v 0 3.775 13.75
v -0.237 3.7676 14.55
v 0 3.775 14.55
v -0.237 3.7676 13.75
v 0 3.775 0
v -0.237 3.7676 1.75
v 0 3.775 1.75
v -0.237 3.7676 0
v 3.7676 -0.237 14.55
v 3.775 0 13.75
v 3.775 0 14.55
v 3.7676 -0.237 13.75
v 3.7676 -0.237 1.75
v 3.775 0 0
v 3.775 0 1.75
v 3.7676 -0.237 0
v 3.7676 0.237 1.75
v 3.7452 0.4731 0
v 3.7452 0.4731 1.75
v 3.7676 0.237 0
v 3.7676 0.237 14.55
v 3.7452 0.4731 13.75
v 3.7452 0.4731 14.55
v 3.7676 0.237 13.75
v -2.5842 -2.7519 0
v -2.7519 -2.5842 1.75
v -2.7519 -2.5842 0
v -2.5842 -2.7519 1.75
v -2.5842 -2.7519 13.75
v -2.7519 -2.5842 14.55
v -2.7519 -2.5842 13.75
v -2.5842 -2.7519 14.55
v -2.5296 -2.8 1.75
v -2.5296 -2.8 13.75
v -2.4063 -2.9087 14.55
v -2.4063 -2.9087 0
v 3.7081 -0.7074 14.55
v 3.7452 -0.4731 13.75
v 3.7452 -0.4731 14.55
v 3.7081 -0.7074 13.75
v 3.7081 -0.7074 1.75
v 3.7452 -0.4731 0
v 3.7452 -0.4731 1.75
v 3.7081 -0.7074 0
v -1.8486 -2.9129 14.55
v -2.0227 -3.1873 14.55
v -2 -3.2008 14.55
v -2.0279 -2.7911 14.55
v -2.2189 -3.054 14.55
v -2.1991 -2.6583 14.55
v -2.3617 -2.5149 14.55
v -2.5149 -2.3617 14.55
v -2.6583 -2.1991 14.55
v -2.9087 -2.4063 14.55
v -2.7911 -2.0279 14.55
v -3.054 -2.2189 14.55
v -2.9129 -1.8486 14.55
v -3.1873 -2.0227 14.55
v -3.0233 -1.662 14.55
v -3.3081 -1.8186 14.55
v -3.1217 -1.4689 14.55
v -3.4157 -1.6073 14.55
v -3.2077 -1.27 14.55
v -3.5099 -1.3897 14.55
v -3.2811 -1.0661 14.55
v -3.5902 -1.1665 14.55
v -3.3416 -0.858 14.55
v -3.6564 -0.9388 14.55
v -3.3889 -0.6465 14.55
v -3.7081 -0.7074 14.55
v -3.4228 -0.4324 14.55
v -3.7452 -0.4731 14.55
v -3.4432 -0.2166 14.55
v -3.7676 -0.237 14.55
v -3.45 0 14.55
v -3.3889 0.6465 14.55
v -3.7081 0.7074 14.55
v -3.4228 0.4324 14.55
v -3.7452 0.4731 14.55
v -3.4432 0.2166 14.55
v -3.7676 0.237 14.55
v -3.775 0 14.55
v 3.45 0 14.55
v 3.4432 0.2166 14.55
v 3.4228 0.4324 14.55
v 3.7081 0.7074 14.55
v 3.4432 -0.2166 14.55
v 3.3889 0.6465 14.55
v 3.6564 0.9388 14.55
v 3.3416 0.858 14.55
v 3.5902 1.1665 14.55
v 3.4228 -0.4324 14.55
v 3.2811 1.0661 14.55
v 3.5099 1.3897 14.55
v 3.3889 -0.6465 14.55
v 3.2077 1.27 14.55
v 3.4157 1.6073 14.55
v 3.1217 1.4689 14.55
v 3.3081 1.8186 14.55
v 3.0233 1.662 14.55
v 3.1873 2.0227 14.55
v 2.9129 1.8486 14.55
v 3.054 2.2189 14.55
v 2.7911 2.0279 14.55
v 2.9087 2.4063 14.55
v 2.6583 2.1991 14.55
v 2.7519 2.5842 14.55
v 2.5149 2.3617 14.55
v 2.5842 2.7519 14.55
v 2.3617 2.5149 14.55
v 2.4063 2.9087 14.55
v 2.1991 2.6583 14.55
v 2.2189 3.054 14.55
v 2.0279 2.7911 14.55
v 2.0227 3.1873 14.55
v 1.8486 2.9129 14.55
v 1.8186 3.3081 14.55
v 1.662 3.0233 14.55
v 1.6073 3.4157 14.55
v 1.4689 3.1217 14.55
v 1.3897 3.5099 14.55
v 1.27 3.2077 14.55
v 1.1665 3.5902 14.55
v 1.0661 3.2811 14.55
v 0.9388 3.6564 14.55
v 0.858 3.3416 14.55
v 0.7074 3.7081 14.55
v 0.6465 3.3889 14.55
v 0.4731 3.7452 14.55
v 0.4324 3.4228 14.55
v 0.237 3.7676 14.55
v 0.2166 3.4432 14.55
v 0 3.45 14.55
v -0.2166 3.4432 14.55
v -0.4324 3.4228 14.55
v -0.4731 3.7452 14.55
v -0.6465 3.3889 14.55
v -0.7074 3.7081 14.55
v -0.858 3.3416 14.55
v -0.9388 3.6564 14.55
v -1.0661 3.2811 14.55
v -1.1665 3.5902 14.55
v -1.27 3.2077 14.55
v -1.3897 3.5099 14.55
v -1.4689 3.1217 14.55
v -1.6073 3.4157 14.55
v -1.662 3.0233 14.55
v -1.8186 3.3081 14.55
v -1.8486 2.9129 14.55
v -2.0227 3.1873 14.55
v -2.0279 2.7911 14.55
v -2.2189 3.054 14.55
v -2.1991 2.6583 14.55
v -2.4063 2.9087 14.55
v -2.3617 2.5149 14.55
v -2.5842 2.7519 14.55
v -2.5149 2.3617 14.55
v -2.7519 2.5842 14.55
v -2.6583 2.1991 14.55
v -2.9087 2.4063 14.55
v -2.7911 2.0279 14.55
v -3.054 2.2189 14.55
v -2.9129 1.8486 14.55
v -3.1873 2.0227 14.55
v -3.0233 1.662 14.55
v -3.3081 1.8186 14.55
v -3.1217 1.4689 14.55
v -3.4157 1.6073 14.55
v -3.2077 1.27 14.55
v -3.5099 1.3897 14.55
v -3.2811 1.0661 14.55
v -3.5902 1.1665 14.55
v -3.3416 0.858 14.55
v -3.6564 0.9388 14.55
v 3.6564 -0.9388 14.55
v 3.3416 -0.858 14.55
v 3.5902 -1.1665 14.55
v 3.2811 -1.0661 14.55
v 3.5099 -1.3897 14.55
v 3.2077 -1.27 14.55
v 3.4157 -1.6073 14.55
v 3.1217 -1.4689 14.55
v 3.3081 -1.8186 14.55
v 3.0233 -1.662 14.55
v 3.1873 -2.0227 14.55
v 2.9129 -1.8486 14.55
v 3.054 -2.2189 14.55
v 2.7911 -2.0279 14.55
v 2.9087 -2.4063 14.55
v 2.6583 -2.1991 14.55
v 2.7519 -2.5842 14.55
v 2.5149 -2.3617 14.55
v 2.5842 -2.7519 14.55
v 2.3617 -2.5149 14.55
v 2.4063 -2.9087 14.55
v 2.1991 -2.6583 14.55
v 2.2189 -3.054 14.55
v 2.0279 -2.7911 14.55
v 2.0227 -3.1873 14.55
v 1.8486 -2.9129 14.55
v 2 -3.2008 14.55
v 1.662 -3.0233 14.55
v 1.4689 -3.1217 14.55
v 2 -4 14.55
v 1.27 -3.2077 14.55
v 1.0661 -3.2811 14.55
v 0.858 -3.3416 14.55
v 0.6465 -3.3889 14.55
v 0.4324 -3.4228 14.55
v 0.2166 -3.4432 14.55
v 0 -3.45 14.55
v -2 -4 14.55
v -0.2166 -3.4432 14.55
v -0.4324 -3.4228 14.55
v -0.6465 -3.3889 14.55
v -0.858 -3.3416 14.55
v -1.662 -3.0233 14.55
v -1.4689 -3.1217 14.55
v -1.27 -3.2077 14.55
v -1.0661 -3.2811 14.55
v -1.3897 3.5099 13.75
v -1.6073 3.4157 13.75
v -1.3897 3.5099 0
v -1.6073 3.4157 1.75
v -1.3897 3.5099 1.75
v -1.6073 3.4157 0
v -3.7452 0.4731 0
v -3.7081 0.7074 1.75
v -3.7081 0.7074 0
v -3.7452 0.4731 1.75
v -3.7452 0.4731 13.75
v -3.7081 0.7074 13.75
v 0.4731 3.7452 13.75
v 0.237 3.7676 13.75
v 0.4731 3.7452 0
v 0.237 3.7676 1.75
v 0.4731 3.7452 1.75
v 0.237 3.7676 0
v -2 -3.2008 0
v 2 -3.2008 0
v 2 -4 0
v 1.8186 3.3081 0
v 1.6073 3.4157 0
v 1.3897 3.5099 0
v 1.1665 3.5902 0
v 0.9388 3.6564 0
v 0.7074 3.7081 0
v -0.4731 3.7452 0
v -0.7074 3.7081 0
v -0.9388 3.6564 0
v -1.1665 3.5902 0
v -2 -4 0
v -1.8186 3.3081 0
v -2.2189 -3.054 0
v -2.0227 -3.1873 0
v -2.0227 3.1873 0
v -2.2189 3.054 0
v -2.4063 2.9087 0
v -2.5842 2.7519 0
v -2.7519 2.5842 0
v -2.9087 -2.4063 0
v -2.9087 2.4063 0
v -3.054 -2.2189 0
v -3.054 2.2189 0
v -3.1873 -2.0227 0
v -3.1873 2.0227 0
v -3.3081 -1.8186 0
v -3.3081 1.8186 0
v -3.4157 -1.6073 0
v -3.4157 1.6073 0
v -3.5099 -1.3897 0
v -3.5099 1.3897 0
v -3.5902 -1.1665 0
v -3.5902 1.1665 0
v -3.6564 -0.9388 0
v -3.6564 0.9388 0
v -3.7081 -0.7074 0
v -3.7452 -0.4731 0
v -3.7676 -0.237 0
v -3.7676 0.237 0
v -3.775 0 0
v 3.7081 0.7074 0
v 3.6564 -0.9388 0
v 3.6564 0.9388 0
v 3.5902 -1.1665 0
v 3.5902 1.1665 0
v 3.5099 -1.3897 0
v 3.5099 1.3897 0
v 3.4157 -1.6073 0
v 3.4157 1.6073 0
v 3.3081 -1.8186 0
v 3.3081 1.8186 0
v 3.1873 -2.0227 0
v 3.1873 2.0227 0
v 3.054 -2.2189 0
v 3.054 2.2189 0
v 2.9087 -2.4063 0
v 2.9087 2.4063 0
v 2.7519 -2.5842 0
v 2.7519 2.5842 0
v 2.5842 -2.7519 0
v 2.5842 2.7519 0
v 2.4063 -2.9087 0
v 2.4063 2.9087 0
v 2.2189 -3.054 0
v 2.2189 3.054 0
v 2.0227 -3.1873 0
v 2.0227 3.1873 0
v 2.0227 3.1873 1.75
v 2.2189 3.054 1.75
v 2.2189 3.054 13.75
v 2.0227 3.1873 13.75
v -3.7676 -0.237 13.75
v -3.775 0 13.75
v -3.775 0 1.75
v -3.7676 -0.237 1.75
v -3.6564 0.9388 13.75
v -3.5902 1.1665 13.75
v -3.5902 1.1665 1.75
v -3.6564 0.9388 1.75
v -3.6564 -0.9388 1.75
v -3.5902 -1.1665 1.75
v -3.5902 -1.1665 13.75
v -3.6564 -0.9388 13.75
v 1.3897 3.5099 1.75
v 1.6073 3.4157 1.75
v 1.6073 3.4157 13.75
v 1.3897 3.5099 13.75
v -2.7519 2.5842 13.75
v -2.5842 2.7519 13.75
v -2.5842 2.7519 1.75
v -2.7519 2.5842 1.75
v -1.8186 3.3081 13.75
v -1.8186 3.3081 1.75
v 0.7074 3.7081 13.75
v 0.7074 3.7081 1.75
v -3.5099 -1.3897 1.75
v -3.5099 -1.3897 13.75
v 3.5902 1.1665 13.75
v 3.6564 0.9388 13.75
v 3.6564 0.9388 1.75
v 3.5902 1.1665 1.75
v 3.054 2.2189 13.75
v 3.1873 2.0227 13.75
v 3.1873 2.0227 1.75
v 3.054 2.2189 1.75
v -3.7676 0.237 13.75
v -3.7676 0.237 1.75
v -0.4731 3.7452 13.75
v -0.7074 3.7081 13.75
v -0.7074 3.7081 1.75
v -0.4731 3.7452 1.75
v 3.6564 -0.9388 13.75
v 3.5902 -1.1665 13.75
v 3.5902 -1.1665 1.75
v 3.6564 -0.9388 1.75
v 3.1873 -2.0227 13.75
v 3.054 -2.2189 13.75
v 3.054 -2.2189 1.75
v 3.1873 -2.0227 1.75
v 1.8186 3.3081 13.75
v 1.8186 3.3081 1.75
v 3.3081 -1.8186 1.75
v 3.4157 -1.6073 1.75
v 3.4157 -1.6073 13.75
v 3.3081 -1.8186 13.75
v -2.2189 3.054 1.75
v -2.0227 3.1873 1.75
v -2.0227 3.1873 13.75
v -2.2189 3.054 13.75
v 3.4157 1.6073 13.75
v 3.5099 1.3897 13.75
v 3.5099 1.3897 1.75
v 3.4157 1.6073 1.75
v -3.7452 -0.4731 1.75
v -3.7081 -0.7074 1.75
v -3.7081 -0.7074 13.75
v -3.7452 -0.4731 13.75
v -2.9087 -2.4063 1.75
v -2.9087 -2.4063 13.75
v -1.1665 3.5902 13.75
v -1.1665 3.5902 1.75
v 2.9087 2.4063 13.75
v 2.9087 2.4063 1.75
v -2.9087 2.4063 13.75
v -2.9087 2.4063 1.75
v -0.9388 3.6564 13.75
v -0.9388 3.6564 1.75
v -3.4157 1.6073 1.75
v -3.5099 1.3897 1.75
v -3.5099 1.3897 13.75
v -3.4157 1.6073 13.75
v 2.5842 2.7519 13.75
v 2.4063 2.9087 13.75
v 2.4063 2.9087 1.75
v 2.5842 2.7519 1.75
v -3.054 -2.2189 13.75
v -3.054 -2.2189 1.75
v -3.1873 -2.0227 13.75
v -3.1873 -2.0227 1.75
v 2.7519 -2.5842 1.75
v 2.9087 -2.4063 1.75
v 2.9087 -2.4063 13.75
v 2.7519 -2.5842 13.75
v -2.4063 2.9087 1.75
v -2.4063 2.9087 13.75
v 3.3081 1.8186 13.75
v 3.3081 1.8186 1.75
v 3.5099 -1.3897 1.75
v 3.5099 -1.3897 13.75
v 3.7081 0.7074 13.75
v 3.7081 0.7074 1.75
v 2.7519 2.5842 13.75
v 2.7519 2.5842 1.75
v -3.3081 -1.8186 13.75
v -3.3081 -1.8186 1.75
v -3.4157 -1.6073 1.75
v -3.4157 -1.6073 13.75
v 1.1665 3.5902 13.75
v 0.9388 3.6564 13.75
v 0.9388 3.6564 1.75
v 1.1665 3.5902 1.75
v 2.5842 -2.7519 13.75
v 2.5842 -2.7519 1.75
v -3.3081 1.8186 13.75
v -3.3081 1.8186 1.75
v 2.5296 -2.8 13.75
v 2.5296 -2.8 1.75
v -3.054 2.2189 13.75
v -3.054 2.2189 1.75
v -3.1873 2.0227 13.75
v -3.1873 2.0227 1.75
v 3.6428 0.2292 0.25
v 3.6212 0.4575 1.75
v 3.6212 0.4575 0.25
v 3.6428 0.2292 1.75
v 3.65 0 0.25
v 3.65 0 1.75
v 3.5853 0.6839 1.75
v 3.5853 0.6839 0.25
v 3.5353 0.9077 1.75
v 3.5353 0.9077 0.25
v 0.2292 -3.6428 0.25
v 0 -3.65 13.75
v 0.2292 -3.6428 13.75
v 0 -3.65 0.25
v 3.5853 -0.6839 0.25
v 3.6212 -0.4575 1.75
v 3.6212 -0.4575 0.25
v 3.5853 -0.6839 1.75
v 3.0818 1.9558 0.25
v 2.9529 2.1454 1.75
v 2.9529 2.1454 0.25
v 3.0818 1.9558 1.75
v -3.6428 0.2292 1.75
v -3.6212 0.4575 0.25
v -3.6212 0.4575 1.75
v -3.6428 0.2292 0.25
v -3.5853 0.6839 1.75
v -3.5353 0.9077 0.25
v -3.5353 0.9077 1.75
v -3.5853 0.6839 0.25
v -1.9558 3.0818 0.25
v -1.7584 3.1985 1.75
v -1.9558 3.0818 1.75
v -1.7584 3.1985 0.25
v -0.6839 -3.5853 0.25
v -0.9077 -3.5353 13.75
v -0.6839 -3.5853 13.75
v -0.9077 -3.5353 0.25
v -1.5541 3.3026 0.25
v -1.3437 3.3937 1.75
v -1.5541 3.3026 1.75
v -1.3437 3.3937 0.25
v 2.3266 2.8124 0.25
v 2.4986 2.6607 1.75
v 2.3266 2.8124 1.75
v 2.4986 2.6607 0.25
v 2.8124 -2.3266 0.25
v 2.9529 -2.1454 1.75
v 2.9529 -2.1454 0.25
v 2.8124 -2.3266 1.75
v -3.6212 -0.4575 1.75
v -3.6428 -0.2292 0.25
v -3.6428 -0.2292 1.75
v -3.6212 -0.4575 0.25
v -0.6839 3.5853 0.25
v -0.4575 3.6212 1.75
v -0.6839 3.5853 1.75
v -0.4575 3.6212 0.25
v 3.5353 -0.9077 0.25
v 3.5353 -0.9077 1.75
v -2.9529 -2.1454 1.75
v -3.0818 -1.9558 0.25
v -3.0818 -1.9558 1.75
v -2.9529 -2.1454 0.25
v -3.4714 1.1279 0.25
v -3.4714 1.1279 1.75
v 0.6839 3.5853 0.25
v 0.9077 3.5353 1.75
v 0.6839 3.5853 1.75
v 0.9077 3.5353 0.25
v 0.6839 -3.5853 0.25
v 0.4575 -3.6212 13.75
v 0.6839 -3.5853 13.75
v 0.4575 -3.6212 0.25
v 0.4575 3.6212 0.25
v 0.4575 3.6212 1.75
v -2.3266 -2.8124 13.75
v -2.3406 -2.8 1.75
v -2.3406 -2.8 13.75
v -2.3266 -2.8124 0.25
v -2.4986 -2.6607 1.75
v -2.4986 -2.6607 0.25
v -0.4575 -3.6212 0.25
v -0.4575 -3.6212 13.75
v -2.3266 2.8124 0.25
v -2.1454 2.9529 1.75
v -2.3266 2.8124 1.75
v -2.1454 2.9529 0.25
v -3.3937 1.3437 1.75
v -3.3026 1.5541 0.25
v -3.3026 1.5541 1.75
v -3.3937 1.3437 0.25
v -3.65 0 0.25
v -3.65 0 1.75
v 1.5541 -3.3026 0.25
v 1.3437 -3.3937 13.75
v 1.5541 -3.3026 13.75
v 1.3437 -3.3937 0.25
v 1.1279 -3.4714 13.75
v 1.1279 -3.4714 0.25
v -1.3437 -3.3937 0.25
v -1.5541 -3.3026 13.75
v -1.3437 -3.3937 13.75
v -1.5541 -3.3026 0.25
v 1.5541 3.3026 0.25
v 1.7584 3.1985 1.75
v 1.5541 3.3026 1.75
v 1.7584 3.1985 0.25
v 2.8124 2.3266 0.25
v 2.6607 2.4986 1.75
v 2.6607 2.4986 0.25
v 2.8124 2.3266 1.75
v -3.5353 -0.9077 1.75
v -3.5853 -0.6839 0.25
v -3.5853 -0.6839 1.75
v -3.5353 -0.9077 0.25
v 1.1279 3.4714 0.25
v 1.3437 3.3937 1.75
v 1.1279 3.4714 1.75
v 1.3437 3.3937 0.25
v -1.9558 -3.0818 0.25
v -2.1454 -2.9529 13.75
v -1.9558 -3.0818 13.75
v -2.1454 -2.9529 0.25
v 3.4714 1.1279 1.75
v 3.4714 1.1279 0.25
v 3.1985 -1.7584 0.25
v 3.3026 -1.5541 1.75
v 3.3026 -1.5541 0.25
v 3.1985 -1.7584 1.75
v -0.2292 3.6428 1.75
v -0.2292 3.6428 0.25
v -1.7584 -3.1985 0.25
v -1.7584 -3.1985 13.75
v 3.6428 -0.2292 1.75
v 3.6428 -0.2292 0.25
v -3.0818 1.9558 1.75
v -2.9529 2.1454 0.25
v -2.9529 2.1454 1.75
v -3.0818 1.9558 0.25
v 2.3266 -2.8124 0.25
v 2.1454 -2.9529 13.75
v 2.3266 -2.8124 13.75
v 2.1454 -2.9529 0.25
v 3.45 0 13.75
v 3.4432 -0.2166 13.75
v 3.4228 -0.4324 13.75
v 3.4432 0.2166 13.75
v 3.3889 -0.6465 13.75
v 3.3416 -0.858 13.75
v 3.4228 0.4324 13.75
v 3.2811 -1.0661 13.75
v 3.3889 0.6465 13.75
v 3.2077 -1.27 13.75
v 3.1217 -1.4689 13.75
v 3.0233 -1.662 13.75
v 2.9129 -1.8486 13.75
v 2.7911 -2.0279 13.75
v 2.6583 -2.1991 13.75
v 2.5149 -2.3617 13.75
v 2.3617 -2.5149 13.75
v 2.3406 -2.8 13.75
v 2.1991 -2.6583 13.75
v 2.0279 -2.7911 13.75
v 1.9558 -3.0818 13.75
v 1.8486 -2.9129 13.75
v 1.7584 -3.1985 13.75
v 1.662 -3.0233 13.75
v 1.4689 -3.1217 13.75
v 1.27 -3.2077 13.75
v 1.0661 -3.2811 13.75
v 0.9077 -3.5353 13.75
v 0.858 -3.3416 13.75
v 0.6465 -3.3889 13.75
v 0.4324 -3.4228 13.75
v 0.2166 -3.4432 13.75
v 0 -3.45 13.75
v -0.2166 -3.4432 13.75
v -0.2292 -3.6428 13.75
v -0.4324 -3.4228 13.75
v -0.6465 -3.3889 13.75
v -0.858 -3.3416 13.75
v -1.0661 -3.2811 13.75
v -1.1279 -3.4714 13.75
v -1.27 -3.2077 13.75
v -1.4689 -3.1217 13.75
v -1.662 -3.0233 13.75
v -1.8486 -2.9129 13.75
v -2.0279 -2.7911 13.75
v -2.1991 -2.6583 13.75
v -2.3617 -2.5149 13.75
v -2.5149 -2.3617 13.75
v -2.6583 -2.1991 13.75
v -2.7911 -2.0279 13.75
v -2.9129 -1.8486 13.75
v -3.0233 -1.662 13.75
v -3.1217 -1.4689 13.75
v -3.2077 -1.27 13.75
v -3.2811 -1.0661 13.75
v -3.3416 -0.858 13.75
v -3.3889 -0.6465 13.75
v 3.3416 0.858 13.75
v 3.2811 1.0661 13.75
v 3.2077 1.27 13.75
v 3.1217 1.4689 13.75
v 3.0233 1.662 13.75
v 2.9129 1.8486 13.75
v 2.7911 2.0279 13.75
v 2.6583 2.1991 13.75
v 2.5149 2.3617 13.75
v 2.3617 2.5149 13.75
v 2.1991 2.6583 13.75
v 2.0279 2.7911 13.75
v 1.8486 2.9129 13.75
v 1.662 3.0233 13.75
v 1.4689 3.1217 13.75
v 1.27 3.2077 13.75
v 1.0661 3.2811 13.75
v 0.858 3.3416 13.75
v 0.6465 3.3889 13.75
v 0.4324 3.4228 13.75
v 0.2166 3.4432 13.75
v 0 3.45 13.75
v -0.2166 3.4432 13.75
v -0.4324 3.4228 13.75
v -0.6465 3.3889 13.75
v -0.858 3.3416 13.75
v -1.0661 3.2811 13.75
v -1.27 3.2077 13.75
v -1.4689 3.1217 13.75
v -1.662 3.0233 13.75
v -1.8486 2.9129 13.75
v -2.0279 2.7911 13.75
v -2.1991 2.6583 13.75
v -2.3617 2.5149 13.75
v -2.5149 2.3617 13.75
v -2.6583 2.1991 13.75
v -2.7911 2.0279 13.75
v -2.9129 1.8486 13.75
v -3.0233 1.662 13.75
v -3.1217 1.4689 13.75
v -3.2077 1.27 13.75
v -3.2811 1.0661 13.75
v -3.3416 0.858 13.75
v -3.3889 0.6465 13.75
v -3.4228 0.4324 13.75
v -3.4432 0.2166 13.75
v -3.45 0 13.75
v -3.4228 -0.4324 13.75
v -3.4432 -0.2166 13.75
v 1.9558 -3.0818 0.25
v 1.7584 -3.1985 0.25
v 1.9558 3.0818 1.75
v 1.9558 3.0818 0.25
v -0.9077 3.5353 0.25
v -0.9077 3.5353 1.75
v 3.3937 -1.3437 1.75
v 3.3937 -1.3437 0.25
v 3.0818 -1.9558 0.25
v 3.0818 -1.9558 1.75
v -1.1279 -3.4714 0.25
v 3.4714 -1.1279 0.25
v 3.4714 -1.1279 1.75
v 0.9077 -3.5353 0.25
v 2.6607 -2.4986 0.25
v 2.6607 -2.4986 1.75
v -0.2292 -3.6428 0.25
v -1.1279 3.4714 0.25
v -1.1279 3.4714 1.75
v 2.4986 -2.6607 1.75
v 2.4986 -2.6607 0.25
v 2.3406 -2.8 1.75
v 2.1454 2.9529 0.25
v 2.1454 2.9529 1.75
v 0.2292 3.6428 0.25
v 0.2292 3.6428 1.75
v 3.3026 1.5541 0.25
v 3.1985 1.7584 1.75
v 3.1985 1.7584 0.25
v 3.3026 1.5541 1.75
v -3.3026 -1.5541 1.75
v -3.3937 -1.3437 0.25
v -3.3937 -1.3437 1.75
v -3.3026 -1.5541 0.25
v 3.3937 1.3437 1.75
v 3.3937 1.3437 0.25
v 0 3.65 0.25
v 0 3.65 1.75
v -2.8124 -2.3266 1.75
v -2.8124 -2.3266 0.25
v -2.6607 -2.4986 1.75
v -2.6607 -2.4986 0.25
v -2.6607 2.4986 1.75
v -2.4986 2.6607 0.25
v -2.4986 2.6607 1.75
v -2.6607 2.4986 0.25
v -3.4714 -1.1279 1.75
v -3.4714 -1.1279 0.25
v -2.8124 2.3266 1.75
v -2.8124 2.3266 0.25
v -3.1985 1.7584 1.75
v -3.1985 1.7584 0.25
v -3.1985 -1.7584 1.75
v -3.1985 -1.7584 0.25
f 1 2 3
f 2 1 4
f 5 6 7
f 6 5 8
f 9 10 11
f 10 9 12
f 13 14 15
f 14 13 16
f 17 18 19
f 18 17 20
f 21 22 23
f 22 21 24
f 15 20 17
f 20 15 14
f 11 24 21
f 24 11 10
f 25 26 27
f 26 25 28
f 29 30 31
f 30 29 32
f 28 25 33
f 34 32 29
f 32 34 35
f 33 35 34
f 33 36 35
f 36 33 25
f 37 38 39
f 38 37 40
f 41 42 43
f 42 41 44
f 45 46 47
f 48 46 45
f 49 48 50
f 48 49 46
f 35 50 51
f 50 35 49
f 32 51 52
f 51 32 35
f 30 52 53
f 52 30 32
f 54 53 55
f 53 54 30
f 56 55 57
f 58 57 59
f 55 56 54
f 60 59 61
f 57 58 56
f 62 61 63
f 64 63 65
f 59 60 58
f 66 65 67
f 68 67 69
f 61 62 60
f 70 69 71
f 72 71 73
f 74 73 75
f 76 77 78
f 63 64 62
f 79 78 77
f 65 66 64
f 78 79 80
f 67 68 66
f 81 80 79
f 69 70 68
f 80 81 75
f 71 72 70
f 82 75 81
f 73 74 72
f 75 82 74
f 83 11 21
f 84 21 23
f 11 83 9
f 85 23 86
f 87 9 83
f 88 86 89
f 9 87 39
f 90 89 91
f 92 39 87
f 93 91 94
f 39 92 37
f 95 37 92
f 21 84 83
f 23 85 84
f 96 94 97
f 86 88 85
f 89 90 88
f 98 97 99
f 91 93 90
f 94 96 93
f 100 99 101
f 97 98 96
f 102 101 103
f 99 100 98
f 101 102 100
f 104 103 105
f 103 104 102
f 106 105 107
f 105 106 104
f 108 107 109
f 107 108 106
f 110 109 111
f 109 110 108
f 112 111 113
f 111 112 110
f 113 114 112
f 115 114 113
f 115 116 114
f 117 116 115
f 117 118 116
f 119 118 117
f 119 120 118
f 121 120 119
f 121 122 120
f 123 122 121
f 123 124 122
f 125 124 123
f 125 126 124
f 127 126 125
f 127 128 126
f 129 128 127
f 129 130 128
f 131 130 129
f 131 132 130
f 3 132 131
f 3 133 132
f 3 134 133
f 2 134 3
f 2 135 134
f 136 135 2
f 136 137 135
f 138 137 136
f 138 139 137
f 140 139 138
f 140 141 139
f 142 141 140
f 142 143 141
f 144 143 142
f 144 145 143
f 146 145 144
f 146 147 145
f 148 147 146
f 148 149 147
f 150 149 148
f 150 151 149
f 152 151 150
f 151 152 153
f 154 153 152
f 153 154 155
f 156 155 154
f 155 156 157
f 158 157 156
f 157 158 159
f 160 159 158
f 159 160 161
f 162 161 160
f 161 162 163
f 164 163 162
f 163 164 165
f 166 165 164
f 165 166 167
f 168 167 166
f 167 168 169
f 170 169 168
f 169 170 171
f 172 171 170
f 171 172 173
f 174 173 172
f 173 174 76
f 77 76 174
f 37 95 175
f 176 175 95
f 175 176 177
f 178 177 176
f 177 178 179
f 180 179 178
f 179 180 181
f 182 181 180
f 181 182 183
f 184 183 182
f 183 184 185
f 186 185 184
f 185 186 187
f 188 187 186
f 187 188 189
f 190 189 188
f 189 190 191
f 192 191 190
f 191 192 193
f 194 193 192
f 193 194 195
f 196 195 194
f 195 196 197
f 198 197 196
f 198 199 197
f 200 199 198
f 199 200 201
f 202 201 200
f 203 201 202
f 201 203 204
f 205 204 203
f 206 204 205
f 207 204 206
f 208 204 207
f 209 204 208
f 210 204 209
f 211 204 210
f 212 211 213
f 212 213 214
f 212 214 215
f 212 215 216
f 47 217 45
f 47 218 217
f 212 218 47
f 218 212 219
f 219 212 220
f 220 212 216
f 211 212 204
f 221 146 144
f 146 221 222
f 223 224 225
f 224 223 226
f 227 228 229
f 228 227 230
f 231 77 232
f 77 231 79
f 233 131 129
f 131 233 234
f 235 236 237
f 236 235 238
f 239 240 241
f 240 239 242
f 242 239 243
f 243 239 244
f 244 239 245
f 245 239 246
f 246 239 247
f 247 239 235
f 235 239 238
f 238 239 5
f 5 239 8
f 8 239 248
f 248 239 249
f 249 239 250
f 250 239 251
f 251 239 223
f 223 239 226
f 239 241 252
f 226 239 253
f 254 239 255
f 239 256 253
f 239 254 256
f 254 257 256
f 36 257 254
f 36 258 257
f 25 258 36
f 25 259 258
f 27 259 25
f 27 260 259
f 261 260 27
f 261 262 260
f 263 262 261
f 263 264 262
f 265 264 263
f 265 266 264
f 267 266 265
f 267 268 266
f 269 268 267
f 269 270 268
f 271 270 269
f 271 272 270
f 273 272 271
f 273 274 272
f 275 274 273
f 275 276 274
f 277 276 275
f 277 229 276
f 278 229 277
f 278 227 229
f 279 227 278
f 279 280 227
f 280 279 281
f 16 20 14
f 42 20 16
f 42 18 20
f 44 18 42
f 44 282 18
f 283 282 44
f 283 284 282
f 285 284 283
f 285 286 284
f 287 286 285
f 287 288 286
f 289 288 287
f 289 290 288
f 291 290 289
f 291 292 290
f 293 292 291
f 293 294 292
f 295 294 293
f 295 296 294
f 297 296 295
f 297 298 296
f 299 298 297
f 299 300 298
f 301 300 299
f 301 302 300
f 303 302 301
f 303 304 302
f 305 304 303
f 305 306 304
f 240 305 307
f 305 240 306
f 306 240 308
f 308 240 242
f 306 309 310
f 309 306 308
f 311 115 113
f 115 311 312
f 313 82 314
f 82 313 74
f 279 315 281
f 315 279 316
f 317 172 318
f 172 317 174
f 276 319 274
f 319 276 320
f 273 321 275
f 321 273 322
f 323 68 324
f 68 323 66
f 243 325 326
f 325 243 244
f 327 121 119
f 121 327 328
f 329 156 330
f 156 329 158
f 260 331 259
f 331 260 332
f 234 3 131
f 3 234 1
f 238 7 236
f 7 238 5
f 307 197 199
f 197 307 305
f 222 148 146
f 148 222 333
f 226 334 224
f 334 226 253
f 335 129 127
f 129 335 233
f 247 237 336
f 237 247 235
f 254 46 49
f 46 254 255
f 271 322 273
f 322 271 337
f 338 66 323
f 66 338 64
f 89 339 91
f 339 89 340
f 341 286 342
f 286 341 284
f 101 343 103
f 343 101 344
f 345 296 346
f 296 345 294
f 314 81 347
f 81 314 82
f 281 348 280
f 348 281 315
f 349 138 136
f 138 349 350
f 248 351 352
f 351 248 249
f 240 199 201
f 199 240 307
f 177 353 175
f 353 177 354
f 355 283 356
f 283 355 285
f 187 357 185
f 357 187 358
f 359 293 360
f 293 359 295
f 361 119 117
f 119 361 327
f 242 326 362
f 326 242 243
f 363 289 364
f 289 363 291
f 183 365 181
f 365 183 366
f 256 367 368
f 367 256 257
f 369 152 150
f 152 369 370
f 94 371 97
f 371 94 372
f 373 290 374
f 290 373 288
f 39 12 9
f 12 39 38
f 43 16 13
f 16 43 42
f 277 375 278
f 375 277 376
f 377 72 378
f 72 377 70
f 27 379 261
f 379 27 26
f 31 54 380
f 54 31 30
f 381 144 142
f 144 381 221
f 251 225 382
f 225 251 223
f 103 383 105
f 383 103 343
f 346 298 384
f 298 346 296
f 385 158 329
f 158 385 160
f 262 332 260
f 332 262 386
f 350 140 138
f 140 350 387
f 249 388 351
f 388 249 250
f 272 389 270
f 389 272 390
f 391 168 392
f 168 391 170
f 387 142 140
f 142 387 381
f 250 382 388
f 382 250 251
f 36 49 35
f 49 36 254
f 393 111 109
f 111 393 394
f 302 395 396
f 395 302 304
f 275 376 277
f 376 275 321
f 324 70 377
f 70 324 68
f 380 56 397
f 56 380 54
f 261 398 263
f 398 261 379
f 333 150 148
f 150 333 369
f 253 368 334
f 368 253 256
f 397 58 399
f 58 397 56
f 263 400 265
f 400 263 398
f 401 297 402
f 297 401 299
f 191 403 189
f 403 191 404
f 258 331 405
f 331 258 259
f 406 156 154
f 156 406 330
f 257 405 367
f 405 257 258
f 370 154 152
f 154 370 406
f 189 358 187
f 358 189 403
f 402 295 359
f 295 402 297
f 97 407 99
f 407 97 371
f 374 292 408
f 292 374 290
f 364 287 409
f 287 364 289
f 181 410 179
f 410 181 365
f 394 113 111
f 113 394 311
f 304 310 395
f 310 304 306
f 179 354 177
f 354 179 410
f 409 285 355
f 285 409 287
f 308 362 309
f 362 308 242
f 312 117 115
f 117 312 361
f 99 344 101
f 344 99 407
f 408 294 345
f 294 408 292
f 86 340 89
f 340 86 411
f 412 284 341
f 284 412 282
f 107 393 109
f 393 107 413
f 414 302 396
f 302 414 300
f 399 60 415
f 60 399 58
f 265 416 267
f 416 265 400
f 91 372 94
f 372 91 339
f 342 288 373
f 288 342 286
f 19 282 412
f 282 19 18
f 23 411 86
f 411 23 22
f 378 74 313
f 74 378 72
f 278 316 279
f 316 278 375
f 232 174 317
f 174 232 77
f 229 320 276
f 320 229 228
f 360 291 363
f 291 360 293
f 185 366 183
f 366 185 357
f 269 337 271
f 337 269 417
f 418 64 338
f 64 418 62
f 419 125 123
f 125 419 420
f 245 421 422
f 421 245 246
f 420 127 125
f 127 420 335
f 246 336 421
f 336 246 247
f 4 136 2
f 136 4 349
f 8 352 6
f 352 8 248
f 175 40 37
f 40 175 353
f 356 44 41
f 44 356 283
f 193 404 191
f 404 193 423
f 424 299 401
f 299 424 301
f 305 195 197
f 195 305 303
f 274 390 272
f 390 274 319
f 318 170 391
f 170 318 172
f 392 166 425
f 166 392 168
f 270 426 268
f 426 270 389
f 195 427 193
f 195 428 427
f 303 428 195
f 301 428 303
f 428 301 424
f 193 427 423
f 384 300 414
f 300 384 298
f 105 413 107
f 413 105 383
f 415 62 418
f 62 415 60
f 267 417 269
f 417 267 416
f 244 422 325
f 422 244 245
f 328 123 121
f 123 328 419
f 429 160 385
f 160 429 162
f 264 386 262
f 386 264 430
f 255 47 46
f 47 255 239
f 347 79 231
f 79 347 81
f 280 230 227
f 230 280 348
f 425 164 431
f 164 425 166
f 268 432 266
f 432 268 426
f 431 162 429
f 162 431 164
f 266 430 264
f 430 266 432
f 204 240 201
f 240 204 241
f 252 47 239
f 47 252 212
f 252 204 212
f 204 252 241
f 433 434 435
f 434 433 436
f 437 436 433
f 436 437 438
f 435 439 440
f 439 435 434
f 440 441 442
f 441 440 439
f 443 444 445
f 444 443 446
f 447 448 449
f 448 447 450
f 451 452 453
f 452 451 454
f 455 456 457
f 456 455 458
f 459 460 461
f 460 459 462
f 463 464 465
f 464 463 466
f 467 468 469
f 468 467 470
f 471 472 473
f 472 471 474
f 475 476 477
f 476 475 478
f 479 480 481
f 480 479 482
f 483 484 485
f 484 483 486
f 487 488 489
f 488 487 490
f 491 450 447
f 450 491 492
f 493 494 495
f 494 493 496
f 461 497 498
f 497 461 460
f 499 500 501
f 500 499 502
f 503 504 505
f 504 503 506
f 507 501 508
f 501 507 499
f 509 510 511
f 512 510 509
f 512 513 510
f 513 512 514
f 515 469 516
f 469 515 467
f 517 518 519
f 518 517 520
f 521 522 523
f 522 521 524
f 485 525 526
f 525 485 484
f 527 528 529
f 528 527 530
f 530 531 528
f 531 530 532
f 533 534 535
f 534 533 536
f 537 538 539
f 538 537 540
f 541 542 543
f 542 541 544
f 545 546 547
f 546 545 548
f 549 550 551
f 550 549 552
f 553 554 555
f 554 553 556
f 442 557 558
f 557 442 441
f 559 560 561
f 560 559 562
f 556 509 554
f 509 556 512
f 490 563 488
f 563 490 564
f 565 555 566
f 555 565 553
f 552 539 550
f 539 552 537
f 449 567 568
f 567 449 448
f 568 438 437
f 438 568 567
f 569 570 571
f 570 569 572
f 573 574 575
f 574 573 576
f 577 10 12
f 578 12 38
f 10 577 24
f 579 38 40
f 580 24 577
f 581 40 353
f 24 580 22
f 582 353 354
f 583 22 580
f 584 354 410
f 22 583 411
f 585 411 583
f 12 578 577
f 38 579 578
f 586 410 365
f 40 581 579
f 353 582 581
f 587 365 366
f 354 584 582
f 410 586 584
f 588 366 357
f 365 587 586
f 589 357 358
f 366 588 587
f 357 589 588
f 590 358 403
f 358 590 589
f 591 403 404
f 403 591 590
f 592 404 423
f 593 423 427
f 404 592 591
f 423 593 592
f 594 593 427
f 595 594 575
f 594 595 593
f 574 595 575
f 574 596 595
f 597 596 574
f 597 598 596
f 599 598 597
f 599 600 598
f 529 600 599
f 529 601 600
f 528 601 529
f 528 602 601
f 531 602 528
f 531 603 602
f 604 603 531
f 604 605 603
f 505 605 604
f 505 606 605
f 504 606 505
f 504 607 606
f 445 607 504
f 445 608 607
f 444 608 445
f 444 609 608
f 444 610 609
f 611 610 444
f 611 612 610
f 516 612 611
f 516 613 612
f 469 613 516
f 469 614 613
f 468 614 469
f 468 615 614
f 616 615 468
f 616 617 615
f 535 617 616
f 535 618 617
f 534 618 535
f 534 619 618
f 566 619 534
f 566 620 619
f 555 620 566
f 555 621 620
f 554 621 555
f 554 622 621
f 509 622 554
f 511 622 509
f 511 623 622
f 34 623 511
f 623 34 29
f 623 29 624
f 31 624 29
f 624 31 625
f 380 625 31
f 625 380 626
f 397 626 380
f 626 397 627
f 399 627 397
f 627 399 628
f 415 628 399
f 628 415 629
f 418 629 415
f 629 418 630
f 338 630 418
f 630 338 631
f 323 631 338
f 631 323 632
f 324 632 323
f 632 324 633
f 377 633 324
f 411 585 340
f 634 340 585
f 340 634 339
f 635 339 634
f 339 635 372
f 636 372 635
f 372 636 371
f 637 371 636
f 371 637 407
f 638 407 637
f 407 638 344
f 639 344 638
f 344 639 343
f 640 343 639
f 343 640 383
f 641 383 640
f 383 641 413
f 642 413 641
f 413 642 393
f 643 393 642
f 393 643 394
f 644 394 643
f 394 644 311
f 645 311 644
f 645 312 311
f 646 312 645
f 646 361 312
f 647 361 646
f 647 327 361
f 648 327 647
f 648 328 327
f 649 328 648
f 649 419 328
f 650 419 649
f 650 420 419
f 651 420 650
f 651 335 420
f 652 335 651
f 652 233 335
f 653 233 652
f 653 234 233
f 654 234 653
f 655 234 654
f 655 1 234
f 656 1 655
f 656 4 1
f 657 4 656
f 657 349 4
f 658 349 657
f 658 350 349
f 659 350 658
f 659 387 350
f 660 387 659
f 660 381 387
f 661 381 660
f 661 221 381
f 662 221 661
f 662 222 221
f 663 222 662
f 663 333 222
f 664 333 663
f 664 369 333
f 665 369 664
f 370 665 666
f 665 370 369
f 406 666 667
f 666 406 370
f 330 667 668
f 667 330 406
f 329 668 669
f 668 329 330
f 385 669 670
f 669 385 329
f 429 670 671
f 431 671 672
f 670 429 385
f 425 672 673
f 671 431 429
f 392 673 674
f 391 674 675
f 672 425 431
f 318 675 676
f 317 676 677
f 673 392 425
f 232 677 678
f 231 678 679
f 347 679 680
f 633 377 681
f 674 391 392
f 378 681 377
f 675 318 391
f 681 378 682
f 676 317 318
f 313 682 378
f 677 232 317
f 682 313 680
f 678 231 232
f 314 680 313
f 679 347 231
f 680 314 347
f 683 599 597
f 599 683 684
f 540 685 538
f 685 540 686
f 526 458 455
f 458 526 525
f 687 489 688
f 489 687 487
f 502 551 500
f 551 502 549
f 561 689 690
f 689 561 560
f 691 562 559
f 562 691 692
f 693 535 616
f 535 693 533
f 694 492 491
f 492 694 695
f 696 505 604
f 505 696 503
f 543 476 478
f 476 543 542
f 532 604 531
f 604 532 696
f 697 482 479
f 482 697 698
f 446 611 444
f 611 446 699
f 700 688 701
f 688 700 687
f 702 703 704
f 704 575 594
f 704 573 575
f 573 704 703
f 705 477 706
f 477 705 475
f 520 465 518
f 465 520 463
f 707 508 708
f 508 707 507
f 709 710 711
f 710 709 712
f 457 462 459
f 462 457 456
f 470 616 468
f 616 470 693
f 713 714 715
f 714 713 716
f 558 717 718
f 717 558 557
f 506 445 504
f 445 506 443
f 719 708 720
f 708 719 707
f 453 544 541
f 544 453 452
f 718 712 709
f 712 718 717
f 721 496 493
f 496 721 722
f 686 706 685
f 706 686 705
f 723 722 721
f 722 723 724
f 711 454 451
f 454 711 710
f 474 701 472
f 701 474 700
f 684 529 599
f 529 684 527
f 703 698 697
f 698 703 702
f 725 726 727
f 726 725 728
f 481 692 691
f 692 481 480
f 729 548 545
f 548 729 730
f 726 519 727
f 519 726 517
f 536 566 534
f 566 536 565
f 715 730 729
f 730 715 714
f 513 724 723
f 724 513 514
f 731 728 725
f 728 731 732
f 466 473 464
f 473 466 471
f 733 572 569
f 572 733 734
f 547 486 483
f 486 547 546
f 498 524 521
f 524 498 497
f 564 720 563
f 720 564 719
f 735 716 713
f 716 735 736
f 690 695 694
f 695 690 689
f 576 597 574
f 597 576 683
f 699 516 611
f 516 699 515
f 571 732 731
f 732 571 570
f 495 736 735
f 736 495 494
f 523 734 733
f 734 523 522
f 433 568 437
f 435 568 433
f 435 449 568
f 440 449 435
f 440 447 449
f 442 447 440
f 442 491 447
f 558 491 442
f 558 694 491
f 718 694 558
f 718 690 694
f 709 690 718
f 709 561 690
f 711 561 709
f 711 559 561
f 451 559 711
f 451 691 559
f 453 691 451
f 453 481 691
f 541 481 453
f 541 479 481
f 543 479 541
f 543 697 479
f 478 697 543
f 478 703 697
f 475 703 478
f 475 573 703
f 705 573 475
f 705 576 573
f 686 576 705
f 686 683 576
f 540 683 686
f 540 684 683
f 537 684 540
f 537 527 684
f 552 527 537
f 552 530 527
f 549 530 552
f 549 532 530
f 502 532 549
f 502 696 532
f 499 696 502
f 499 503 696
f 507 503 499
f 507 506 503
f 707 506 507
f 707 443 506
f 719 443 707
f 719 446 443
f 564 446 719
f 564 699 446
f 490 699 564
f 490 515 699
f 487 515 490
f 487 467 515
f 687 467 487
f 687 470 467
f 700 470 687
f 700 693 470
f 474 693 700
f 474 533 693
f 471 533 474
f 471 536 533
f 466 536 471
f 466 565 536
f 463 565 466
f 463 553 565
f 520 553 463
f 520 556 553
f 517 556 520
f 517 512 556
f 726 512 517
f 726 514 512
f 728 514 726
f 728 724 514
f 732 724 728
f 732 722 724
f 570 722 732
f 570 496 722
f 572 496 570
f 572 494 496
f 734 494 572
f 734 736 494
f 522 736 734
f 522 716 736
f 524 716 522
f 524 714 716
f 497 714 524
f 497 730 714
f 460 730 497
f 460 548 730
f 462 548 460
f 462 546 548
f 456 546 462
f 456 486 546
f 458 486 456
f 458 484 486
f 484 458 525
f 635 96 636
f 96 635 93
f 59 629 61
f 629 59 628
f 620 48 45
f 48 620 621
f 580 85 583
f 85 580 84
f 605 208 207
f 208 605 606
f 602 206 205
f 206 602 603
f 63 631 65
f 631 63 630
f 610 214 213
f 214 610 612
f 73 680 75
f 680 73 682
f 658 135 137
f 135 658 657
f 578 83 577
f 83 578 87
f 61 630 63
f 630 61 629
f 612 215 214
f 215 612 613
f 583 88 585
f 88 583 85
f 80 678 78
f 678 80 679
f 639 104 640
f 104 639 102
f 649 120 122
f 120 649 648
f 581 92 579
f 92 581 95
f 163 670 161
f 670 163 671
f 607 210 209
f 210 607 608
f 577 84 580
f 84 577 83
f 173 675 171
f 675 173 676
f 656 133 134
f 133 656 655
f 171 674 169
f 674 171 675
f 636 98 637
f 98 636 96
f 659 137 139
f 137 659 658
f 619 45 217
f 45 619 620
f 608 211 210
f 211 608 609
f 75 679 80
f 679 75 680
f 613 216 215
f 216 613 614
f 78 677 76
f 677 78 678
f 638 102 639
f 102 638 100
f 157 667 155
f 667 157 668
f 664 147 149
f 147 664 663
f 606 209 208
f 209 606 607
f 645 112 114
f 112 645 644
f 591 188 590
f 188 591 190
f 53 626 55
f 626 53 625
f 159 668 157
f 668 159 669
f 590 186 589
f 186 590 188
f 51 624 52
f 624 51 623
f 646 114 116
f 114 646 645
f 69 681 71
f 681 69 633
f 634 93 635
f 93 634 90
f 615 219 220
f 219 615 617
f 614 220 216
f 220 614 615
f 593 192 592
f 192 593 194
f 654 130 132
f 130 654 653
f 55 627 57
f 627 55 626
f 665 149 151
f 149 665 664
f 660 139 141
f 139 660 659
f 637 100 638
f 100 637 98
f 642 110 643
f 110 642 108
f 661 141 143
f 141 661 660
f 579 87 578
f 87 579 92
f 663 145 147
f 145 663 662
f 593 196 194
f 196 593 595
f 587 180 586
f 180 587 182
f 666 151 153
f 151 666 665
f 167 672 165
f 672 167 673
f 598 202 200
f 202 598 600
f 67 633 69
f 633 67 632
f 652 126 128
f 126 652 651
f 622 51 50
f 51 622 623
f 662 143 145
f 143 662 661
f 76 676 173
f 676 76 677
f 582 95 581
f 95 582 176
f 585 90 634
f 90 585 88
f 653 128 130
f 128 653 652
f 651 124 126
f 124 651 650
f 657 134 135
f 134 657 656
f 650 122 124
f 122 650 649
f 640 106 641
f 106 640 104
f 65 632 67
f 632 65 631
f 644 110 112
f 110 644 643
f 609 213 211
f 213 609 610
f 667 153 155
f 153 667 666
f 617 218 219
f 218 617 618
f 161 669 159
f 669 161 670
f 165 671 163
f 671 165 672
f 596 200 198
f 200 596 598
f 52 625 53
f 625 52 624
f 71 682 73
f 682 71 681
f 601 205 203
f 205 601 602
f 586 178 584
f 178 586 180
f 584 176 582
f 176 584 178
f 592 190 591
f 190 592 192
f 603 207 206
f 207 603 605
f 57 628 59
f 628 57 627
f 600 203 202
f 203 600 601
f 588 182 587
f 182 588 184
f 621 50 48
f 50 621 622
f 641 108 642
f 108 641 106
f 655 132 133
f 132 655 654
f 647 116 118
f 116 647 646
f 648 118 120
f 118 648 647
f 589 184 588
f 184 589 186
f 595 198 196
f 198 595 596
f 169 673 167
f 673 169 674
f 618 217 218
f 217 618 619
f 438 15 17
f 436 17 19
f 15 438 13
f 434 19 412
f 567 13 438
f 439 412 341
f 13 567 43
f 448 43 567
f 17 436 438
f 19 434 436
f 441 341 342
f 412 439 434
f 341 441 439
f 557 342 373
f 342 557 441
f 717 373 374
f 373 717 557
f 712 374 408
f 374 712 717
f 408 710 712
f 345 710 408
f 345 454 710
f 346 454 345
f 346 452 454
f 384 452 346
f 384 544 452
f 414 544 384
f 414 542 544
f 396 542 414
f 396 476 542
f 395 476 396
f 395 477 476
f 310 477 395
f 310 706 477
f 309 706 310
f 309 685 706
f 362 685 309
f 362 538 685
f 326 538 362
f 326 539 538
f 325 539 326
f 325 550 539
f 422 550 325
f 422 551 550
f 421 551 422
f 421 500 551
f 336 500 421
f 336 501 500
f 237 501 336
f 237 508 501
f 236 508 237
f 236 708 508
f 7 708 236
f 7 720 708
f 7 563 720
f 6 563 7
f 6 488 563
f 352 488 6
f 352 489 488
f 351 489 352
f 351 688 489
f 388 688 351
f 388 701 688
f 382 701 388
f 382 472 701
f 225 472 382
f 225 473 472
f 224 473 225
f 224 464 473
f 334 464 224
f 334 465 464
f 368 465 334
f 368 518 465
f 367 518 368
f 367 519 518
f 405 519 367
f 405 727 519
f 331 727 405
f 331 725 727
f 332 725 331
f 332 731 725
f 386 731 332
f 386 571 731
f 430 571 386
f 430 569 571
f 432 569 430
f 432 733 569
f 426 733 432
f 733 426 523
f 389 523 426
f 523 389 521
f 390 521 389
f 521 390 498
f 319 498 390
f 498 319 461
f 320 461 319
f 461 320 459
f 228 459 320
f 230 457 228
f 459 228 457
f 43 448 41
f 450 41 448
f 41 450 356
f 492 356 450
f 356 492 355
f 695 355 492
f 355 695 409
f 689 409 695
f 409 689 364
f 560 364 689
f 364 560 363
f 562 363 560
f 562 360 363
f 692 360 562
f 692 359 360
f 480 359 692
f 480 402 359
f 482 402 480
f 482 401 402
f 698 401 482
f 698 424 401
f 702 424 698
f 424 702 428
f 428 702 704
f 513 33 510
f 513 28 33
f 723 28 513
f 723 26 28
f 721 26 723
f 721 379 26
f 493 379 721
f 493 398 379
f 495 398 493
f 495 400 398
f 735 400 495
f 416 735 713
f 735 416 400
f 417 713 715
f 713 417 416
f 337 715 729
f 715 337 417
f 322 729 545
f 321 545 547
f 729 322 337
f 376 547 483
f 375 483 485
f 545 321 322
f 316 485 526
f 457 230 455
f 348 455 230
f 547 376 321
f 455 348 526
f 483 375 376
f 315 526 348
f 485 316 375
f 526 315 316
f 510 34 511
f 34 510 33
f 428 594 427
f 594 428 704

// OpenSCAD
wall_width=.25;

b_width = 7.3;
b_width_s = 6.9;
b_height = 14.3;
b_height_s = 13.5;

bottom_h = 1.5;




difference(){

 union(){   
cylinder(d=b_width+wall_width,h=b_height+wall_width,$fn=100);
translate([-2,-4,0])cube([4,1,b_height+wall_width]);
 }
    
translate([-5,-2.8,bottom_h+wall_width])cube([10,10,b_height_s-bottom_h]);

translate([0,0,wall_width])union(){
cylinder(d=b_width,h=b_height_s,$fn=100);
cylinder(d=b_width_s,h=b_height,$fn=100);
}

}
